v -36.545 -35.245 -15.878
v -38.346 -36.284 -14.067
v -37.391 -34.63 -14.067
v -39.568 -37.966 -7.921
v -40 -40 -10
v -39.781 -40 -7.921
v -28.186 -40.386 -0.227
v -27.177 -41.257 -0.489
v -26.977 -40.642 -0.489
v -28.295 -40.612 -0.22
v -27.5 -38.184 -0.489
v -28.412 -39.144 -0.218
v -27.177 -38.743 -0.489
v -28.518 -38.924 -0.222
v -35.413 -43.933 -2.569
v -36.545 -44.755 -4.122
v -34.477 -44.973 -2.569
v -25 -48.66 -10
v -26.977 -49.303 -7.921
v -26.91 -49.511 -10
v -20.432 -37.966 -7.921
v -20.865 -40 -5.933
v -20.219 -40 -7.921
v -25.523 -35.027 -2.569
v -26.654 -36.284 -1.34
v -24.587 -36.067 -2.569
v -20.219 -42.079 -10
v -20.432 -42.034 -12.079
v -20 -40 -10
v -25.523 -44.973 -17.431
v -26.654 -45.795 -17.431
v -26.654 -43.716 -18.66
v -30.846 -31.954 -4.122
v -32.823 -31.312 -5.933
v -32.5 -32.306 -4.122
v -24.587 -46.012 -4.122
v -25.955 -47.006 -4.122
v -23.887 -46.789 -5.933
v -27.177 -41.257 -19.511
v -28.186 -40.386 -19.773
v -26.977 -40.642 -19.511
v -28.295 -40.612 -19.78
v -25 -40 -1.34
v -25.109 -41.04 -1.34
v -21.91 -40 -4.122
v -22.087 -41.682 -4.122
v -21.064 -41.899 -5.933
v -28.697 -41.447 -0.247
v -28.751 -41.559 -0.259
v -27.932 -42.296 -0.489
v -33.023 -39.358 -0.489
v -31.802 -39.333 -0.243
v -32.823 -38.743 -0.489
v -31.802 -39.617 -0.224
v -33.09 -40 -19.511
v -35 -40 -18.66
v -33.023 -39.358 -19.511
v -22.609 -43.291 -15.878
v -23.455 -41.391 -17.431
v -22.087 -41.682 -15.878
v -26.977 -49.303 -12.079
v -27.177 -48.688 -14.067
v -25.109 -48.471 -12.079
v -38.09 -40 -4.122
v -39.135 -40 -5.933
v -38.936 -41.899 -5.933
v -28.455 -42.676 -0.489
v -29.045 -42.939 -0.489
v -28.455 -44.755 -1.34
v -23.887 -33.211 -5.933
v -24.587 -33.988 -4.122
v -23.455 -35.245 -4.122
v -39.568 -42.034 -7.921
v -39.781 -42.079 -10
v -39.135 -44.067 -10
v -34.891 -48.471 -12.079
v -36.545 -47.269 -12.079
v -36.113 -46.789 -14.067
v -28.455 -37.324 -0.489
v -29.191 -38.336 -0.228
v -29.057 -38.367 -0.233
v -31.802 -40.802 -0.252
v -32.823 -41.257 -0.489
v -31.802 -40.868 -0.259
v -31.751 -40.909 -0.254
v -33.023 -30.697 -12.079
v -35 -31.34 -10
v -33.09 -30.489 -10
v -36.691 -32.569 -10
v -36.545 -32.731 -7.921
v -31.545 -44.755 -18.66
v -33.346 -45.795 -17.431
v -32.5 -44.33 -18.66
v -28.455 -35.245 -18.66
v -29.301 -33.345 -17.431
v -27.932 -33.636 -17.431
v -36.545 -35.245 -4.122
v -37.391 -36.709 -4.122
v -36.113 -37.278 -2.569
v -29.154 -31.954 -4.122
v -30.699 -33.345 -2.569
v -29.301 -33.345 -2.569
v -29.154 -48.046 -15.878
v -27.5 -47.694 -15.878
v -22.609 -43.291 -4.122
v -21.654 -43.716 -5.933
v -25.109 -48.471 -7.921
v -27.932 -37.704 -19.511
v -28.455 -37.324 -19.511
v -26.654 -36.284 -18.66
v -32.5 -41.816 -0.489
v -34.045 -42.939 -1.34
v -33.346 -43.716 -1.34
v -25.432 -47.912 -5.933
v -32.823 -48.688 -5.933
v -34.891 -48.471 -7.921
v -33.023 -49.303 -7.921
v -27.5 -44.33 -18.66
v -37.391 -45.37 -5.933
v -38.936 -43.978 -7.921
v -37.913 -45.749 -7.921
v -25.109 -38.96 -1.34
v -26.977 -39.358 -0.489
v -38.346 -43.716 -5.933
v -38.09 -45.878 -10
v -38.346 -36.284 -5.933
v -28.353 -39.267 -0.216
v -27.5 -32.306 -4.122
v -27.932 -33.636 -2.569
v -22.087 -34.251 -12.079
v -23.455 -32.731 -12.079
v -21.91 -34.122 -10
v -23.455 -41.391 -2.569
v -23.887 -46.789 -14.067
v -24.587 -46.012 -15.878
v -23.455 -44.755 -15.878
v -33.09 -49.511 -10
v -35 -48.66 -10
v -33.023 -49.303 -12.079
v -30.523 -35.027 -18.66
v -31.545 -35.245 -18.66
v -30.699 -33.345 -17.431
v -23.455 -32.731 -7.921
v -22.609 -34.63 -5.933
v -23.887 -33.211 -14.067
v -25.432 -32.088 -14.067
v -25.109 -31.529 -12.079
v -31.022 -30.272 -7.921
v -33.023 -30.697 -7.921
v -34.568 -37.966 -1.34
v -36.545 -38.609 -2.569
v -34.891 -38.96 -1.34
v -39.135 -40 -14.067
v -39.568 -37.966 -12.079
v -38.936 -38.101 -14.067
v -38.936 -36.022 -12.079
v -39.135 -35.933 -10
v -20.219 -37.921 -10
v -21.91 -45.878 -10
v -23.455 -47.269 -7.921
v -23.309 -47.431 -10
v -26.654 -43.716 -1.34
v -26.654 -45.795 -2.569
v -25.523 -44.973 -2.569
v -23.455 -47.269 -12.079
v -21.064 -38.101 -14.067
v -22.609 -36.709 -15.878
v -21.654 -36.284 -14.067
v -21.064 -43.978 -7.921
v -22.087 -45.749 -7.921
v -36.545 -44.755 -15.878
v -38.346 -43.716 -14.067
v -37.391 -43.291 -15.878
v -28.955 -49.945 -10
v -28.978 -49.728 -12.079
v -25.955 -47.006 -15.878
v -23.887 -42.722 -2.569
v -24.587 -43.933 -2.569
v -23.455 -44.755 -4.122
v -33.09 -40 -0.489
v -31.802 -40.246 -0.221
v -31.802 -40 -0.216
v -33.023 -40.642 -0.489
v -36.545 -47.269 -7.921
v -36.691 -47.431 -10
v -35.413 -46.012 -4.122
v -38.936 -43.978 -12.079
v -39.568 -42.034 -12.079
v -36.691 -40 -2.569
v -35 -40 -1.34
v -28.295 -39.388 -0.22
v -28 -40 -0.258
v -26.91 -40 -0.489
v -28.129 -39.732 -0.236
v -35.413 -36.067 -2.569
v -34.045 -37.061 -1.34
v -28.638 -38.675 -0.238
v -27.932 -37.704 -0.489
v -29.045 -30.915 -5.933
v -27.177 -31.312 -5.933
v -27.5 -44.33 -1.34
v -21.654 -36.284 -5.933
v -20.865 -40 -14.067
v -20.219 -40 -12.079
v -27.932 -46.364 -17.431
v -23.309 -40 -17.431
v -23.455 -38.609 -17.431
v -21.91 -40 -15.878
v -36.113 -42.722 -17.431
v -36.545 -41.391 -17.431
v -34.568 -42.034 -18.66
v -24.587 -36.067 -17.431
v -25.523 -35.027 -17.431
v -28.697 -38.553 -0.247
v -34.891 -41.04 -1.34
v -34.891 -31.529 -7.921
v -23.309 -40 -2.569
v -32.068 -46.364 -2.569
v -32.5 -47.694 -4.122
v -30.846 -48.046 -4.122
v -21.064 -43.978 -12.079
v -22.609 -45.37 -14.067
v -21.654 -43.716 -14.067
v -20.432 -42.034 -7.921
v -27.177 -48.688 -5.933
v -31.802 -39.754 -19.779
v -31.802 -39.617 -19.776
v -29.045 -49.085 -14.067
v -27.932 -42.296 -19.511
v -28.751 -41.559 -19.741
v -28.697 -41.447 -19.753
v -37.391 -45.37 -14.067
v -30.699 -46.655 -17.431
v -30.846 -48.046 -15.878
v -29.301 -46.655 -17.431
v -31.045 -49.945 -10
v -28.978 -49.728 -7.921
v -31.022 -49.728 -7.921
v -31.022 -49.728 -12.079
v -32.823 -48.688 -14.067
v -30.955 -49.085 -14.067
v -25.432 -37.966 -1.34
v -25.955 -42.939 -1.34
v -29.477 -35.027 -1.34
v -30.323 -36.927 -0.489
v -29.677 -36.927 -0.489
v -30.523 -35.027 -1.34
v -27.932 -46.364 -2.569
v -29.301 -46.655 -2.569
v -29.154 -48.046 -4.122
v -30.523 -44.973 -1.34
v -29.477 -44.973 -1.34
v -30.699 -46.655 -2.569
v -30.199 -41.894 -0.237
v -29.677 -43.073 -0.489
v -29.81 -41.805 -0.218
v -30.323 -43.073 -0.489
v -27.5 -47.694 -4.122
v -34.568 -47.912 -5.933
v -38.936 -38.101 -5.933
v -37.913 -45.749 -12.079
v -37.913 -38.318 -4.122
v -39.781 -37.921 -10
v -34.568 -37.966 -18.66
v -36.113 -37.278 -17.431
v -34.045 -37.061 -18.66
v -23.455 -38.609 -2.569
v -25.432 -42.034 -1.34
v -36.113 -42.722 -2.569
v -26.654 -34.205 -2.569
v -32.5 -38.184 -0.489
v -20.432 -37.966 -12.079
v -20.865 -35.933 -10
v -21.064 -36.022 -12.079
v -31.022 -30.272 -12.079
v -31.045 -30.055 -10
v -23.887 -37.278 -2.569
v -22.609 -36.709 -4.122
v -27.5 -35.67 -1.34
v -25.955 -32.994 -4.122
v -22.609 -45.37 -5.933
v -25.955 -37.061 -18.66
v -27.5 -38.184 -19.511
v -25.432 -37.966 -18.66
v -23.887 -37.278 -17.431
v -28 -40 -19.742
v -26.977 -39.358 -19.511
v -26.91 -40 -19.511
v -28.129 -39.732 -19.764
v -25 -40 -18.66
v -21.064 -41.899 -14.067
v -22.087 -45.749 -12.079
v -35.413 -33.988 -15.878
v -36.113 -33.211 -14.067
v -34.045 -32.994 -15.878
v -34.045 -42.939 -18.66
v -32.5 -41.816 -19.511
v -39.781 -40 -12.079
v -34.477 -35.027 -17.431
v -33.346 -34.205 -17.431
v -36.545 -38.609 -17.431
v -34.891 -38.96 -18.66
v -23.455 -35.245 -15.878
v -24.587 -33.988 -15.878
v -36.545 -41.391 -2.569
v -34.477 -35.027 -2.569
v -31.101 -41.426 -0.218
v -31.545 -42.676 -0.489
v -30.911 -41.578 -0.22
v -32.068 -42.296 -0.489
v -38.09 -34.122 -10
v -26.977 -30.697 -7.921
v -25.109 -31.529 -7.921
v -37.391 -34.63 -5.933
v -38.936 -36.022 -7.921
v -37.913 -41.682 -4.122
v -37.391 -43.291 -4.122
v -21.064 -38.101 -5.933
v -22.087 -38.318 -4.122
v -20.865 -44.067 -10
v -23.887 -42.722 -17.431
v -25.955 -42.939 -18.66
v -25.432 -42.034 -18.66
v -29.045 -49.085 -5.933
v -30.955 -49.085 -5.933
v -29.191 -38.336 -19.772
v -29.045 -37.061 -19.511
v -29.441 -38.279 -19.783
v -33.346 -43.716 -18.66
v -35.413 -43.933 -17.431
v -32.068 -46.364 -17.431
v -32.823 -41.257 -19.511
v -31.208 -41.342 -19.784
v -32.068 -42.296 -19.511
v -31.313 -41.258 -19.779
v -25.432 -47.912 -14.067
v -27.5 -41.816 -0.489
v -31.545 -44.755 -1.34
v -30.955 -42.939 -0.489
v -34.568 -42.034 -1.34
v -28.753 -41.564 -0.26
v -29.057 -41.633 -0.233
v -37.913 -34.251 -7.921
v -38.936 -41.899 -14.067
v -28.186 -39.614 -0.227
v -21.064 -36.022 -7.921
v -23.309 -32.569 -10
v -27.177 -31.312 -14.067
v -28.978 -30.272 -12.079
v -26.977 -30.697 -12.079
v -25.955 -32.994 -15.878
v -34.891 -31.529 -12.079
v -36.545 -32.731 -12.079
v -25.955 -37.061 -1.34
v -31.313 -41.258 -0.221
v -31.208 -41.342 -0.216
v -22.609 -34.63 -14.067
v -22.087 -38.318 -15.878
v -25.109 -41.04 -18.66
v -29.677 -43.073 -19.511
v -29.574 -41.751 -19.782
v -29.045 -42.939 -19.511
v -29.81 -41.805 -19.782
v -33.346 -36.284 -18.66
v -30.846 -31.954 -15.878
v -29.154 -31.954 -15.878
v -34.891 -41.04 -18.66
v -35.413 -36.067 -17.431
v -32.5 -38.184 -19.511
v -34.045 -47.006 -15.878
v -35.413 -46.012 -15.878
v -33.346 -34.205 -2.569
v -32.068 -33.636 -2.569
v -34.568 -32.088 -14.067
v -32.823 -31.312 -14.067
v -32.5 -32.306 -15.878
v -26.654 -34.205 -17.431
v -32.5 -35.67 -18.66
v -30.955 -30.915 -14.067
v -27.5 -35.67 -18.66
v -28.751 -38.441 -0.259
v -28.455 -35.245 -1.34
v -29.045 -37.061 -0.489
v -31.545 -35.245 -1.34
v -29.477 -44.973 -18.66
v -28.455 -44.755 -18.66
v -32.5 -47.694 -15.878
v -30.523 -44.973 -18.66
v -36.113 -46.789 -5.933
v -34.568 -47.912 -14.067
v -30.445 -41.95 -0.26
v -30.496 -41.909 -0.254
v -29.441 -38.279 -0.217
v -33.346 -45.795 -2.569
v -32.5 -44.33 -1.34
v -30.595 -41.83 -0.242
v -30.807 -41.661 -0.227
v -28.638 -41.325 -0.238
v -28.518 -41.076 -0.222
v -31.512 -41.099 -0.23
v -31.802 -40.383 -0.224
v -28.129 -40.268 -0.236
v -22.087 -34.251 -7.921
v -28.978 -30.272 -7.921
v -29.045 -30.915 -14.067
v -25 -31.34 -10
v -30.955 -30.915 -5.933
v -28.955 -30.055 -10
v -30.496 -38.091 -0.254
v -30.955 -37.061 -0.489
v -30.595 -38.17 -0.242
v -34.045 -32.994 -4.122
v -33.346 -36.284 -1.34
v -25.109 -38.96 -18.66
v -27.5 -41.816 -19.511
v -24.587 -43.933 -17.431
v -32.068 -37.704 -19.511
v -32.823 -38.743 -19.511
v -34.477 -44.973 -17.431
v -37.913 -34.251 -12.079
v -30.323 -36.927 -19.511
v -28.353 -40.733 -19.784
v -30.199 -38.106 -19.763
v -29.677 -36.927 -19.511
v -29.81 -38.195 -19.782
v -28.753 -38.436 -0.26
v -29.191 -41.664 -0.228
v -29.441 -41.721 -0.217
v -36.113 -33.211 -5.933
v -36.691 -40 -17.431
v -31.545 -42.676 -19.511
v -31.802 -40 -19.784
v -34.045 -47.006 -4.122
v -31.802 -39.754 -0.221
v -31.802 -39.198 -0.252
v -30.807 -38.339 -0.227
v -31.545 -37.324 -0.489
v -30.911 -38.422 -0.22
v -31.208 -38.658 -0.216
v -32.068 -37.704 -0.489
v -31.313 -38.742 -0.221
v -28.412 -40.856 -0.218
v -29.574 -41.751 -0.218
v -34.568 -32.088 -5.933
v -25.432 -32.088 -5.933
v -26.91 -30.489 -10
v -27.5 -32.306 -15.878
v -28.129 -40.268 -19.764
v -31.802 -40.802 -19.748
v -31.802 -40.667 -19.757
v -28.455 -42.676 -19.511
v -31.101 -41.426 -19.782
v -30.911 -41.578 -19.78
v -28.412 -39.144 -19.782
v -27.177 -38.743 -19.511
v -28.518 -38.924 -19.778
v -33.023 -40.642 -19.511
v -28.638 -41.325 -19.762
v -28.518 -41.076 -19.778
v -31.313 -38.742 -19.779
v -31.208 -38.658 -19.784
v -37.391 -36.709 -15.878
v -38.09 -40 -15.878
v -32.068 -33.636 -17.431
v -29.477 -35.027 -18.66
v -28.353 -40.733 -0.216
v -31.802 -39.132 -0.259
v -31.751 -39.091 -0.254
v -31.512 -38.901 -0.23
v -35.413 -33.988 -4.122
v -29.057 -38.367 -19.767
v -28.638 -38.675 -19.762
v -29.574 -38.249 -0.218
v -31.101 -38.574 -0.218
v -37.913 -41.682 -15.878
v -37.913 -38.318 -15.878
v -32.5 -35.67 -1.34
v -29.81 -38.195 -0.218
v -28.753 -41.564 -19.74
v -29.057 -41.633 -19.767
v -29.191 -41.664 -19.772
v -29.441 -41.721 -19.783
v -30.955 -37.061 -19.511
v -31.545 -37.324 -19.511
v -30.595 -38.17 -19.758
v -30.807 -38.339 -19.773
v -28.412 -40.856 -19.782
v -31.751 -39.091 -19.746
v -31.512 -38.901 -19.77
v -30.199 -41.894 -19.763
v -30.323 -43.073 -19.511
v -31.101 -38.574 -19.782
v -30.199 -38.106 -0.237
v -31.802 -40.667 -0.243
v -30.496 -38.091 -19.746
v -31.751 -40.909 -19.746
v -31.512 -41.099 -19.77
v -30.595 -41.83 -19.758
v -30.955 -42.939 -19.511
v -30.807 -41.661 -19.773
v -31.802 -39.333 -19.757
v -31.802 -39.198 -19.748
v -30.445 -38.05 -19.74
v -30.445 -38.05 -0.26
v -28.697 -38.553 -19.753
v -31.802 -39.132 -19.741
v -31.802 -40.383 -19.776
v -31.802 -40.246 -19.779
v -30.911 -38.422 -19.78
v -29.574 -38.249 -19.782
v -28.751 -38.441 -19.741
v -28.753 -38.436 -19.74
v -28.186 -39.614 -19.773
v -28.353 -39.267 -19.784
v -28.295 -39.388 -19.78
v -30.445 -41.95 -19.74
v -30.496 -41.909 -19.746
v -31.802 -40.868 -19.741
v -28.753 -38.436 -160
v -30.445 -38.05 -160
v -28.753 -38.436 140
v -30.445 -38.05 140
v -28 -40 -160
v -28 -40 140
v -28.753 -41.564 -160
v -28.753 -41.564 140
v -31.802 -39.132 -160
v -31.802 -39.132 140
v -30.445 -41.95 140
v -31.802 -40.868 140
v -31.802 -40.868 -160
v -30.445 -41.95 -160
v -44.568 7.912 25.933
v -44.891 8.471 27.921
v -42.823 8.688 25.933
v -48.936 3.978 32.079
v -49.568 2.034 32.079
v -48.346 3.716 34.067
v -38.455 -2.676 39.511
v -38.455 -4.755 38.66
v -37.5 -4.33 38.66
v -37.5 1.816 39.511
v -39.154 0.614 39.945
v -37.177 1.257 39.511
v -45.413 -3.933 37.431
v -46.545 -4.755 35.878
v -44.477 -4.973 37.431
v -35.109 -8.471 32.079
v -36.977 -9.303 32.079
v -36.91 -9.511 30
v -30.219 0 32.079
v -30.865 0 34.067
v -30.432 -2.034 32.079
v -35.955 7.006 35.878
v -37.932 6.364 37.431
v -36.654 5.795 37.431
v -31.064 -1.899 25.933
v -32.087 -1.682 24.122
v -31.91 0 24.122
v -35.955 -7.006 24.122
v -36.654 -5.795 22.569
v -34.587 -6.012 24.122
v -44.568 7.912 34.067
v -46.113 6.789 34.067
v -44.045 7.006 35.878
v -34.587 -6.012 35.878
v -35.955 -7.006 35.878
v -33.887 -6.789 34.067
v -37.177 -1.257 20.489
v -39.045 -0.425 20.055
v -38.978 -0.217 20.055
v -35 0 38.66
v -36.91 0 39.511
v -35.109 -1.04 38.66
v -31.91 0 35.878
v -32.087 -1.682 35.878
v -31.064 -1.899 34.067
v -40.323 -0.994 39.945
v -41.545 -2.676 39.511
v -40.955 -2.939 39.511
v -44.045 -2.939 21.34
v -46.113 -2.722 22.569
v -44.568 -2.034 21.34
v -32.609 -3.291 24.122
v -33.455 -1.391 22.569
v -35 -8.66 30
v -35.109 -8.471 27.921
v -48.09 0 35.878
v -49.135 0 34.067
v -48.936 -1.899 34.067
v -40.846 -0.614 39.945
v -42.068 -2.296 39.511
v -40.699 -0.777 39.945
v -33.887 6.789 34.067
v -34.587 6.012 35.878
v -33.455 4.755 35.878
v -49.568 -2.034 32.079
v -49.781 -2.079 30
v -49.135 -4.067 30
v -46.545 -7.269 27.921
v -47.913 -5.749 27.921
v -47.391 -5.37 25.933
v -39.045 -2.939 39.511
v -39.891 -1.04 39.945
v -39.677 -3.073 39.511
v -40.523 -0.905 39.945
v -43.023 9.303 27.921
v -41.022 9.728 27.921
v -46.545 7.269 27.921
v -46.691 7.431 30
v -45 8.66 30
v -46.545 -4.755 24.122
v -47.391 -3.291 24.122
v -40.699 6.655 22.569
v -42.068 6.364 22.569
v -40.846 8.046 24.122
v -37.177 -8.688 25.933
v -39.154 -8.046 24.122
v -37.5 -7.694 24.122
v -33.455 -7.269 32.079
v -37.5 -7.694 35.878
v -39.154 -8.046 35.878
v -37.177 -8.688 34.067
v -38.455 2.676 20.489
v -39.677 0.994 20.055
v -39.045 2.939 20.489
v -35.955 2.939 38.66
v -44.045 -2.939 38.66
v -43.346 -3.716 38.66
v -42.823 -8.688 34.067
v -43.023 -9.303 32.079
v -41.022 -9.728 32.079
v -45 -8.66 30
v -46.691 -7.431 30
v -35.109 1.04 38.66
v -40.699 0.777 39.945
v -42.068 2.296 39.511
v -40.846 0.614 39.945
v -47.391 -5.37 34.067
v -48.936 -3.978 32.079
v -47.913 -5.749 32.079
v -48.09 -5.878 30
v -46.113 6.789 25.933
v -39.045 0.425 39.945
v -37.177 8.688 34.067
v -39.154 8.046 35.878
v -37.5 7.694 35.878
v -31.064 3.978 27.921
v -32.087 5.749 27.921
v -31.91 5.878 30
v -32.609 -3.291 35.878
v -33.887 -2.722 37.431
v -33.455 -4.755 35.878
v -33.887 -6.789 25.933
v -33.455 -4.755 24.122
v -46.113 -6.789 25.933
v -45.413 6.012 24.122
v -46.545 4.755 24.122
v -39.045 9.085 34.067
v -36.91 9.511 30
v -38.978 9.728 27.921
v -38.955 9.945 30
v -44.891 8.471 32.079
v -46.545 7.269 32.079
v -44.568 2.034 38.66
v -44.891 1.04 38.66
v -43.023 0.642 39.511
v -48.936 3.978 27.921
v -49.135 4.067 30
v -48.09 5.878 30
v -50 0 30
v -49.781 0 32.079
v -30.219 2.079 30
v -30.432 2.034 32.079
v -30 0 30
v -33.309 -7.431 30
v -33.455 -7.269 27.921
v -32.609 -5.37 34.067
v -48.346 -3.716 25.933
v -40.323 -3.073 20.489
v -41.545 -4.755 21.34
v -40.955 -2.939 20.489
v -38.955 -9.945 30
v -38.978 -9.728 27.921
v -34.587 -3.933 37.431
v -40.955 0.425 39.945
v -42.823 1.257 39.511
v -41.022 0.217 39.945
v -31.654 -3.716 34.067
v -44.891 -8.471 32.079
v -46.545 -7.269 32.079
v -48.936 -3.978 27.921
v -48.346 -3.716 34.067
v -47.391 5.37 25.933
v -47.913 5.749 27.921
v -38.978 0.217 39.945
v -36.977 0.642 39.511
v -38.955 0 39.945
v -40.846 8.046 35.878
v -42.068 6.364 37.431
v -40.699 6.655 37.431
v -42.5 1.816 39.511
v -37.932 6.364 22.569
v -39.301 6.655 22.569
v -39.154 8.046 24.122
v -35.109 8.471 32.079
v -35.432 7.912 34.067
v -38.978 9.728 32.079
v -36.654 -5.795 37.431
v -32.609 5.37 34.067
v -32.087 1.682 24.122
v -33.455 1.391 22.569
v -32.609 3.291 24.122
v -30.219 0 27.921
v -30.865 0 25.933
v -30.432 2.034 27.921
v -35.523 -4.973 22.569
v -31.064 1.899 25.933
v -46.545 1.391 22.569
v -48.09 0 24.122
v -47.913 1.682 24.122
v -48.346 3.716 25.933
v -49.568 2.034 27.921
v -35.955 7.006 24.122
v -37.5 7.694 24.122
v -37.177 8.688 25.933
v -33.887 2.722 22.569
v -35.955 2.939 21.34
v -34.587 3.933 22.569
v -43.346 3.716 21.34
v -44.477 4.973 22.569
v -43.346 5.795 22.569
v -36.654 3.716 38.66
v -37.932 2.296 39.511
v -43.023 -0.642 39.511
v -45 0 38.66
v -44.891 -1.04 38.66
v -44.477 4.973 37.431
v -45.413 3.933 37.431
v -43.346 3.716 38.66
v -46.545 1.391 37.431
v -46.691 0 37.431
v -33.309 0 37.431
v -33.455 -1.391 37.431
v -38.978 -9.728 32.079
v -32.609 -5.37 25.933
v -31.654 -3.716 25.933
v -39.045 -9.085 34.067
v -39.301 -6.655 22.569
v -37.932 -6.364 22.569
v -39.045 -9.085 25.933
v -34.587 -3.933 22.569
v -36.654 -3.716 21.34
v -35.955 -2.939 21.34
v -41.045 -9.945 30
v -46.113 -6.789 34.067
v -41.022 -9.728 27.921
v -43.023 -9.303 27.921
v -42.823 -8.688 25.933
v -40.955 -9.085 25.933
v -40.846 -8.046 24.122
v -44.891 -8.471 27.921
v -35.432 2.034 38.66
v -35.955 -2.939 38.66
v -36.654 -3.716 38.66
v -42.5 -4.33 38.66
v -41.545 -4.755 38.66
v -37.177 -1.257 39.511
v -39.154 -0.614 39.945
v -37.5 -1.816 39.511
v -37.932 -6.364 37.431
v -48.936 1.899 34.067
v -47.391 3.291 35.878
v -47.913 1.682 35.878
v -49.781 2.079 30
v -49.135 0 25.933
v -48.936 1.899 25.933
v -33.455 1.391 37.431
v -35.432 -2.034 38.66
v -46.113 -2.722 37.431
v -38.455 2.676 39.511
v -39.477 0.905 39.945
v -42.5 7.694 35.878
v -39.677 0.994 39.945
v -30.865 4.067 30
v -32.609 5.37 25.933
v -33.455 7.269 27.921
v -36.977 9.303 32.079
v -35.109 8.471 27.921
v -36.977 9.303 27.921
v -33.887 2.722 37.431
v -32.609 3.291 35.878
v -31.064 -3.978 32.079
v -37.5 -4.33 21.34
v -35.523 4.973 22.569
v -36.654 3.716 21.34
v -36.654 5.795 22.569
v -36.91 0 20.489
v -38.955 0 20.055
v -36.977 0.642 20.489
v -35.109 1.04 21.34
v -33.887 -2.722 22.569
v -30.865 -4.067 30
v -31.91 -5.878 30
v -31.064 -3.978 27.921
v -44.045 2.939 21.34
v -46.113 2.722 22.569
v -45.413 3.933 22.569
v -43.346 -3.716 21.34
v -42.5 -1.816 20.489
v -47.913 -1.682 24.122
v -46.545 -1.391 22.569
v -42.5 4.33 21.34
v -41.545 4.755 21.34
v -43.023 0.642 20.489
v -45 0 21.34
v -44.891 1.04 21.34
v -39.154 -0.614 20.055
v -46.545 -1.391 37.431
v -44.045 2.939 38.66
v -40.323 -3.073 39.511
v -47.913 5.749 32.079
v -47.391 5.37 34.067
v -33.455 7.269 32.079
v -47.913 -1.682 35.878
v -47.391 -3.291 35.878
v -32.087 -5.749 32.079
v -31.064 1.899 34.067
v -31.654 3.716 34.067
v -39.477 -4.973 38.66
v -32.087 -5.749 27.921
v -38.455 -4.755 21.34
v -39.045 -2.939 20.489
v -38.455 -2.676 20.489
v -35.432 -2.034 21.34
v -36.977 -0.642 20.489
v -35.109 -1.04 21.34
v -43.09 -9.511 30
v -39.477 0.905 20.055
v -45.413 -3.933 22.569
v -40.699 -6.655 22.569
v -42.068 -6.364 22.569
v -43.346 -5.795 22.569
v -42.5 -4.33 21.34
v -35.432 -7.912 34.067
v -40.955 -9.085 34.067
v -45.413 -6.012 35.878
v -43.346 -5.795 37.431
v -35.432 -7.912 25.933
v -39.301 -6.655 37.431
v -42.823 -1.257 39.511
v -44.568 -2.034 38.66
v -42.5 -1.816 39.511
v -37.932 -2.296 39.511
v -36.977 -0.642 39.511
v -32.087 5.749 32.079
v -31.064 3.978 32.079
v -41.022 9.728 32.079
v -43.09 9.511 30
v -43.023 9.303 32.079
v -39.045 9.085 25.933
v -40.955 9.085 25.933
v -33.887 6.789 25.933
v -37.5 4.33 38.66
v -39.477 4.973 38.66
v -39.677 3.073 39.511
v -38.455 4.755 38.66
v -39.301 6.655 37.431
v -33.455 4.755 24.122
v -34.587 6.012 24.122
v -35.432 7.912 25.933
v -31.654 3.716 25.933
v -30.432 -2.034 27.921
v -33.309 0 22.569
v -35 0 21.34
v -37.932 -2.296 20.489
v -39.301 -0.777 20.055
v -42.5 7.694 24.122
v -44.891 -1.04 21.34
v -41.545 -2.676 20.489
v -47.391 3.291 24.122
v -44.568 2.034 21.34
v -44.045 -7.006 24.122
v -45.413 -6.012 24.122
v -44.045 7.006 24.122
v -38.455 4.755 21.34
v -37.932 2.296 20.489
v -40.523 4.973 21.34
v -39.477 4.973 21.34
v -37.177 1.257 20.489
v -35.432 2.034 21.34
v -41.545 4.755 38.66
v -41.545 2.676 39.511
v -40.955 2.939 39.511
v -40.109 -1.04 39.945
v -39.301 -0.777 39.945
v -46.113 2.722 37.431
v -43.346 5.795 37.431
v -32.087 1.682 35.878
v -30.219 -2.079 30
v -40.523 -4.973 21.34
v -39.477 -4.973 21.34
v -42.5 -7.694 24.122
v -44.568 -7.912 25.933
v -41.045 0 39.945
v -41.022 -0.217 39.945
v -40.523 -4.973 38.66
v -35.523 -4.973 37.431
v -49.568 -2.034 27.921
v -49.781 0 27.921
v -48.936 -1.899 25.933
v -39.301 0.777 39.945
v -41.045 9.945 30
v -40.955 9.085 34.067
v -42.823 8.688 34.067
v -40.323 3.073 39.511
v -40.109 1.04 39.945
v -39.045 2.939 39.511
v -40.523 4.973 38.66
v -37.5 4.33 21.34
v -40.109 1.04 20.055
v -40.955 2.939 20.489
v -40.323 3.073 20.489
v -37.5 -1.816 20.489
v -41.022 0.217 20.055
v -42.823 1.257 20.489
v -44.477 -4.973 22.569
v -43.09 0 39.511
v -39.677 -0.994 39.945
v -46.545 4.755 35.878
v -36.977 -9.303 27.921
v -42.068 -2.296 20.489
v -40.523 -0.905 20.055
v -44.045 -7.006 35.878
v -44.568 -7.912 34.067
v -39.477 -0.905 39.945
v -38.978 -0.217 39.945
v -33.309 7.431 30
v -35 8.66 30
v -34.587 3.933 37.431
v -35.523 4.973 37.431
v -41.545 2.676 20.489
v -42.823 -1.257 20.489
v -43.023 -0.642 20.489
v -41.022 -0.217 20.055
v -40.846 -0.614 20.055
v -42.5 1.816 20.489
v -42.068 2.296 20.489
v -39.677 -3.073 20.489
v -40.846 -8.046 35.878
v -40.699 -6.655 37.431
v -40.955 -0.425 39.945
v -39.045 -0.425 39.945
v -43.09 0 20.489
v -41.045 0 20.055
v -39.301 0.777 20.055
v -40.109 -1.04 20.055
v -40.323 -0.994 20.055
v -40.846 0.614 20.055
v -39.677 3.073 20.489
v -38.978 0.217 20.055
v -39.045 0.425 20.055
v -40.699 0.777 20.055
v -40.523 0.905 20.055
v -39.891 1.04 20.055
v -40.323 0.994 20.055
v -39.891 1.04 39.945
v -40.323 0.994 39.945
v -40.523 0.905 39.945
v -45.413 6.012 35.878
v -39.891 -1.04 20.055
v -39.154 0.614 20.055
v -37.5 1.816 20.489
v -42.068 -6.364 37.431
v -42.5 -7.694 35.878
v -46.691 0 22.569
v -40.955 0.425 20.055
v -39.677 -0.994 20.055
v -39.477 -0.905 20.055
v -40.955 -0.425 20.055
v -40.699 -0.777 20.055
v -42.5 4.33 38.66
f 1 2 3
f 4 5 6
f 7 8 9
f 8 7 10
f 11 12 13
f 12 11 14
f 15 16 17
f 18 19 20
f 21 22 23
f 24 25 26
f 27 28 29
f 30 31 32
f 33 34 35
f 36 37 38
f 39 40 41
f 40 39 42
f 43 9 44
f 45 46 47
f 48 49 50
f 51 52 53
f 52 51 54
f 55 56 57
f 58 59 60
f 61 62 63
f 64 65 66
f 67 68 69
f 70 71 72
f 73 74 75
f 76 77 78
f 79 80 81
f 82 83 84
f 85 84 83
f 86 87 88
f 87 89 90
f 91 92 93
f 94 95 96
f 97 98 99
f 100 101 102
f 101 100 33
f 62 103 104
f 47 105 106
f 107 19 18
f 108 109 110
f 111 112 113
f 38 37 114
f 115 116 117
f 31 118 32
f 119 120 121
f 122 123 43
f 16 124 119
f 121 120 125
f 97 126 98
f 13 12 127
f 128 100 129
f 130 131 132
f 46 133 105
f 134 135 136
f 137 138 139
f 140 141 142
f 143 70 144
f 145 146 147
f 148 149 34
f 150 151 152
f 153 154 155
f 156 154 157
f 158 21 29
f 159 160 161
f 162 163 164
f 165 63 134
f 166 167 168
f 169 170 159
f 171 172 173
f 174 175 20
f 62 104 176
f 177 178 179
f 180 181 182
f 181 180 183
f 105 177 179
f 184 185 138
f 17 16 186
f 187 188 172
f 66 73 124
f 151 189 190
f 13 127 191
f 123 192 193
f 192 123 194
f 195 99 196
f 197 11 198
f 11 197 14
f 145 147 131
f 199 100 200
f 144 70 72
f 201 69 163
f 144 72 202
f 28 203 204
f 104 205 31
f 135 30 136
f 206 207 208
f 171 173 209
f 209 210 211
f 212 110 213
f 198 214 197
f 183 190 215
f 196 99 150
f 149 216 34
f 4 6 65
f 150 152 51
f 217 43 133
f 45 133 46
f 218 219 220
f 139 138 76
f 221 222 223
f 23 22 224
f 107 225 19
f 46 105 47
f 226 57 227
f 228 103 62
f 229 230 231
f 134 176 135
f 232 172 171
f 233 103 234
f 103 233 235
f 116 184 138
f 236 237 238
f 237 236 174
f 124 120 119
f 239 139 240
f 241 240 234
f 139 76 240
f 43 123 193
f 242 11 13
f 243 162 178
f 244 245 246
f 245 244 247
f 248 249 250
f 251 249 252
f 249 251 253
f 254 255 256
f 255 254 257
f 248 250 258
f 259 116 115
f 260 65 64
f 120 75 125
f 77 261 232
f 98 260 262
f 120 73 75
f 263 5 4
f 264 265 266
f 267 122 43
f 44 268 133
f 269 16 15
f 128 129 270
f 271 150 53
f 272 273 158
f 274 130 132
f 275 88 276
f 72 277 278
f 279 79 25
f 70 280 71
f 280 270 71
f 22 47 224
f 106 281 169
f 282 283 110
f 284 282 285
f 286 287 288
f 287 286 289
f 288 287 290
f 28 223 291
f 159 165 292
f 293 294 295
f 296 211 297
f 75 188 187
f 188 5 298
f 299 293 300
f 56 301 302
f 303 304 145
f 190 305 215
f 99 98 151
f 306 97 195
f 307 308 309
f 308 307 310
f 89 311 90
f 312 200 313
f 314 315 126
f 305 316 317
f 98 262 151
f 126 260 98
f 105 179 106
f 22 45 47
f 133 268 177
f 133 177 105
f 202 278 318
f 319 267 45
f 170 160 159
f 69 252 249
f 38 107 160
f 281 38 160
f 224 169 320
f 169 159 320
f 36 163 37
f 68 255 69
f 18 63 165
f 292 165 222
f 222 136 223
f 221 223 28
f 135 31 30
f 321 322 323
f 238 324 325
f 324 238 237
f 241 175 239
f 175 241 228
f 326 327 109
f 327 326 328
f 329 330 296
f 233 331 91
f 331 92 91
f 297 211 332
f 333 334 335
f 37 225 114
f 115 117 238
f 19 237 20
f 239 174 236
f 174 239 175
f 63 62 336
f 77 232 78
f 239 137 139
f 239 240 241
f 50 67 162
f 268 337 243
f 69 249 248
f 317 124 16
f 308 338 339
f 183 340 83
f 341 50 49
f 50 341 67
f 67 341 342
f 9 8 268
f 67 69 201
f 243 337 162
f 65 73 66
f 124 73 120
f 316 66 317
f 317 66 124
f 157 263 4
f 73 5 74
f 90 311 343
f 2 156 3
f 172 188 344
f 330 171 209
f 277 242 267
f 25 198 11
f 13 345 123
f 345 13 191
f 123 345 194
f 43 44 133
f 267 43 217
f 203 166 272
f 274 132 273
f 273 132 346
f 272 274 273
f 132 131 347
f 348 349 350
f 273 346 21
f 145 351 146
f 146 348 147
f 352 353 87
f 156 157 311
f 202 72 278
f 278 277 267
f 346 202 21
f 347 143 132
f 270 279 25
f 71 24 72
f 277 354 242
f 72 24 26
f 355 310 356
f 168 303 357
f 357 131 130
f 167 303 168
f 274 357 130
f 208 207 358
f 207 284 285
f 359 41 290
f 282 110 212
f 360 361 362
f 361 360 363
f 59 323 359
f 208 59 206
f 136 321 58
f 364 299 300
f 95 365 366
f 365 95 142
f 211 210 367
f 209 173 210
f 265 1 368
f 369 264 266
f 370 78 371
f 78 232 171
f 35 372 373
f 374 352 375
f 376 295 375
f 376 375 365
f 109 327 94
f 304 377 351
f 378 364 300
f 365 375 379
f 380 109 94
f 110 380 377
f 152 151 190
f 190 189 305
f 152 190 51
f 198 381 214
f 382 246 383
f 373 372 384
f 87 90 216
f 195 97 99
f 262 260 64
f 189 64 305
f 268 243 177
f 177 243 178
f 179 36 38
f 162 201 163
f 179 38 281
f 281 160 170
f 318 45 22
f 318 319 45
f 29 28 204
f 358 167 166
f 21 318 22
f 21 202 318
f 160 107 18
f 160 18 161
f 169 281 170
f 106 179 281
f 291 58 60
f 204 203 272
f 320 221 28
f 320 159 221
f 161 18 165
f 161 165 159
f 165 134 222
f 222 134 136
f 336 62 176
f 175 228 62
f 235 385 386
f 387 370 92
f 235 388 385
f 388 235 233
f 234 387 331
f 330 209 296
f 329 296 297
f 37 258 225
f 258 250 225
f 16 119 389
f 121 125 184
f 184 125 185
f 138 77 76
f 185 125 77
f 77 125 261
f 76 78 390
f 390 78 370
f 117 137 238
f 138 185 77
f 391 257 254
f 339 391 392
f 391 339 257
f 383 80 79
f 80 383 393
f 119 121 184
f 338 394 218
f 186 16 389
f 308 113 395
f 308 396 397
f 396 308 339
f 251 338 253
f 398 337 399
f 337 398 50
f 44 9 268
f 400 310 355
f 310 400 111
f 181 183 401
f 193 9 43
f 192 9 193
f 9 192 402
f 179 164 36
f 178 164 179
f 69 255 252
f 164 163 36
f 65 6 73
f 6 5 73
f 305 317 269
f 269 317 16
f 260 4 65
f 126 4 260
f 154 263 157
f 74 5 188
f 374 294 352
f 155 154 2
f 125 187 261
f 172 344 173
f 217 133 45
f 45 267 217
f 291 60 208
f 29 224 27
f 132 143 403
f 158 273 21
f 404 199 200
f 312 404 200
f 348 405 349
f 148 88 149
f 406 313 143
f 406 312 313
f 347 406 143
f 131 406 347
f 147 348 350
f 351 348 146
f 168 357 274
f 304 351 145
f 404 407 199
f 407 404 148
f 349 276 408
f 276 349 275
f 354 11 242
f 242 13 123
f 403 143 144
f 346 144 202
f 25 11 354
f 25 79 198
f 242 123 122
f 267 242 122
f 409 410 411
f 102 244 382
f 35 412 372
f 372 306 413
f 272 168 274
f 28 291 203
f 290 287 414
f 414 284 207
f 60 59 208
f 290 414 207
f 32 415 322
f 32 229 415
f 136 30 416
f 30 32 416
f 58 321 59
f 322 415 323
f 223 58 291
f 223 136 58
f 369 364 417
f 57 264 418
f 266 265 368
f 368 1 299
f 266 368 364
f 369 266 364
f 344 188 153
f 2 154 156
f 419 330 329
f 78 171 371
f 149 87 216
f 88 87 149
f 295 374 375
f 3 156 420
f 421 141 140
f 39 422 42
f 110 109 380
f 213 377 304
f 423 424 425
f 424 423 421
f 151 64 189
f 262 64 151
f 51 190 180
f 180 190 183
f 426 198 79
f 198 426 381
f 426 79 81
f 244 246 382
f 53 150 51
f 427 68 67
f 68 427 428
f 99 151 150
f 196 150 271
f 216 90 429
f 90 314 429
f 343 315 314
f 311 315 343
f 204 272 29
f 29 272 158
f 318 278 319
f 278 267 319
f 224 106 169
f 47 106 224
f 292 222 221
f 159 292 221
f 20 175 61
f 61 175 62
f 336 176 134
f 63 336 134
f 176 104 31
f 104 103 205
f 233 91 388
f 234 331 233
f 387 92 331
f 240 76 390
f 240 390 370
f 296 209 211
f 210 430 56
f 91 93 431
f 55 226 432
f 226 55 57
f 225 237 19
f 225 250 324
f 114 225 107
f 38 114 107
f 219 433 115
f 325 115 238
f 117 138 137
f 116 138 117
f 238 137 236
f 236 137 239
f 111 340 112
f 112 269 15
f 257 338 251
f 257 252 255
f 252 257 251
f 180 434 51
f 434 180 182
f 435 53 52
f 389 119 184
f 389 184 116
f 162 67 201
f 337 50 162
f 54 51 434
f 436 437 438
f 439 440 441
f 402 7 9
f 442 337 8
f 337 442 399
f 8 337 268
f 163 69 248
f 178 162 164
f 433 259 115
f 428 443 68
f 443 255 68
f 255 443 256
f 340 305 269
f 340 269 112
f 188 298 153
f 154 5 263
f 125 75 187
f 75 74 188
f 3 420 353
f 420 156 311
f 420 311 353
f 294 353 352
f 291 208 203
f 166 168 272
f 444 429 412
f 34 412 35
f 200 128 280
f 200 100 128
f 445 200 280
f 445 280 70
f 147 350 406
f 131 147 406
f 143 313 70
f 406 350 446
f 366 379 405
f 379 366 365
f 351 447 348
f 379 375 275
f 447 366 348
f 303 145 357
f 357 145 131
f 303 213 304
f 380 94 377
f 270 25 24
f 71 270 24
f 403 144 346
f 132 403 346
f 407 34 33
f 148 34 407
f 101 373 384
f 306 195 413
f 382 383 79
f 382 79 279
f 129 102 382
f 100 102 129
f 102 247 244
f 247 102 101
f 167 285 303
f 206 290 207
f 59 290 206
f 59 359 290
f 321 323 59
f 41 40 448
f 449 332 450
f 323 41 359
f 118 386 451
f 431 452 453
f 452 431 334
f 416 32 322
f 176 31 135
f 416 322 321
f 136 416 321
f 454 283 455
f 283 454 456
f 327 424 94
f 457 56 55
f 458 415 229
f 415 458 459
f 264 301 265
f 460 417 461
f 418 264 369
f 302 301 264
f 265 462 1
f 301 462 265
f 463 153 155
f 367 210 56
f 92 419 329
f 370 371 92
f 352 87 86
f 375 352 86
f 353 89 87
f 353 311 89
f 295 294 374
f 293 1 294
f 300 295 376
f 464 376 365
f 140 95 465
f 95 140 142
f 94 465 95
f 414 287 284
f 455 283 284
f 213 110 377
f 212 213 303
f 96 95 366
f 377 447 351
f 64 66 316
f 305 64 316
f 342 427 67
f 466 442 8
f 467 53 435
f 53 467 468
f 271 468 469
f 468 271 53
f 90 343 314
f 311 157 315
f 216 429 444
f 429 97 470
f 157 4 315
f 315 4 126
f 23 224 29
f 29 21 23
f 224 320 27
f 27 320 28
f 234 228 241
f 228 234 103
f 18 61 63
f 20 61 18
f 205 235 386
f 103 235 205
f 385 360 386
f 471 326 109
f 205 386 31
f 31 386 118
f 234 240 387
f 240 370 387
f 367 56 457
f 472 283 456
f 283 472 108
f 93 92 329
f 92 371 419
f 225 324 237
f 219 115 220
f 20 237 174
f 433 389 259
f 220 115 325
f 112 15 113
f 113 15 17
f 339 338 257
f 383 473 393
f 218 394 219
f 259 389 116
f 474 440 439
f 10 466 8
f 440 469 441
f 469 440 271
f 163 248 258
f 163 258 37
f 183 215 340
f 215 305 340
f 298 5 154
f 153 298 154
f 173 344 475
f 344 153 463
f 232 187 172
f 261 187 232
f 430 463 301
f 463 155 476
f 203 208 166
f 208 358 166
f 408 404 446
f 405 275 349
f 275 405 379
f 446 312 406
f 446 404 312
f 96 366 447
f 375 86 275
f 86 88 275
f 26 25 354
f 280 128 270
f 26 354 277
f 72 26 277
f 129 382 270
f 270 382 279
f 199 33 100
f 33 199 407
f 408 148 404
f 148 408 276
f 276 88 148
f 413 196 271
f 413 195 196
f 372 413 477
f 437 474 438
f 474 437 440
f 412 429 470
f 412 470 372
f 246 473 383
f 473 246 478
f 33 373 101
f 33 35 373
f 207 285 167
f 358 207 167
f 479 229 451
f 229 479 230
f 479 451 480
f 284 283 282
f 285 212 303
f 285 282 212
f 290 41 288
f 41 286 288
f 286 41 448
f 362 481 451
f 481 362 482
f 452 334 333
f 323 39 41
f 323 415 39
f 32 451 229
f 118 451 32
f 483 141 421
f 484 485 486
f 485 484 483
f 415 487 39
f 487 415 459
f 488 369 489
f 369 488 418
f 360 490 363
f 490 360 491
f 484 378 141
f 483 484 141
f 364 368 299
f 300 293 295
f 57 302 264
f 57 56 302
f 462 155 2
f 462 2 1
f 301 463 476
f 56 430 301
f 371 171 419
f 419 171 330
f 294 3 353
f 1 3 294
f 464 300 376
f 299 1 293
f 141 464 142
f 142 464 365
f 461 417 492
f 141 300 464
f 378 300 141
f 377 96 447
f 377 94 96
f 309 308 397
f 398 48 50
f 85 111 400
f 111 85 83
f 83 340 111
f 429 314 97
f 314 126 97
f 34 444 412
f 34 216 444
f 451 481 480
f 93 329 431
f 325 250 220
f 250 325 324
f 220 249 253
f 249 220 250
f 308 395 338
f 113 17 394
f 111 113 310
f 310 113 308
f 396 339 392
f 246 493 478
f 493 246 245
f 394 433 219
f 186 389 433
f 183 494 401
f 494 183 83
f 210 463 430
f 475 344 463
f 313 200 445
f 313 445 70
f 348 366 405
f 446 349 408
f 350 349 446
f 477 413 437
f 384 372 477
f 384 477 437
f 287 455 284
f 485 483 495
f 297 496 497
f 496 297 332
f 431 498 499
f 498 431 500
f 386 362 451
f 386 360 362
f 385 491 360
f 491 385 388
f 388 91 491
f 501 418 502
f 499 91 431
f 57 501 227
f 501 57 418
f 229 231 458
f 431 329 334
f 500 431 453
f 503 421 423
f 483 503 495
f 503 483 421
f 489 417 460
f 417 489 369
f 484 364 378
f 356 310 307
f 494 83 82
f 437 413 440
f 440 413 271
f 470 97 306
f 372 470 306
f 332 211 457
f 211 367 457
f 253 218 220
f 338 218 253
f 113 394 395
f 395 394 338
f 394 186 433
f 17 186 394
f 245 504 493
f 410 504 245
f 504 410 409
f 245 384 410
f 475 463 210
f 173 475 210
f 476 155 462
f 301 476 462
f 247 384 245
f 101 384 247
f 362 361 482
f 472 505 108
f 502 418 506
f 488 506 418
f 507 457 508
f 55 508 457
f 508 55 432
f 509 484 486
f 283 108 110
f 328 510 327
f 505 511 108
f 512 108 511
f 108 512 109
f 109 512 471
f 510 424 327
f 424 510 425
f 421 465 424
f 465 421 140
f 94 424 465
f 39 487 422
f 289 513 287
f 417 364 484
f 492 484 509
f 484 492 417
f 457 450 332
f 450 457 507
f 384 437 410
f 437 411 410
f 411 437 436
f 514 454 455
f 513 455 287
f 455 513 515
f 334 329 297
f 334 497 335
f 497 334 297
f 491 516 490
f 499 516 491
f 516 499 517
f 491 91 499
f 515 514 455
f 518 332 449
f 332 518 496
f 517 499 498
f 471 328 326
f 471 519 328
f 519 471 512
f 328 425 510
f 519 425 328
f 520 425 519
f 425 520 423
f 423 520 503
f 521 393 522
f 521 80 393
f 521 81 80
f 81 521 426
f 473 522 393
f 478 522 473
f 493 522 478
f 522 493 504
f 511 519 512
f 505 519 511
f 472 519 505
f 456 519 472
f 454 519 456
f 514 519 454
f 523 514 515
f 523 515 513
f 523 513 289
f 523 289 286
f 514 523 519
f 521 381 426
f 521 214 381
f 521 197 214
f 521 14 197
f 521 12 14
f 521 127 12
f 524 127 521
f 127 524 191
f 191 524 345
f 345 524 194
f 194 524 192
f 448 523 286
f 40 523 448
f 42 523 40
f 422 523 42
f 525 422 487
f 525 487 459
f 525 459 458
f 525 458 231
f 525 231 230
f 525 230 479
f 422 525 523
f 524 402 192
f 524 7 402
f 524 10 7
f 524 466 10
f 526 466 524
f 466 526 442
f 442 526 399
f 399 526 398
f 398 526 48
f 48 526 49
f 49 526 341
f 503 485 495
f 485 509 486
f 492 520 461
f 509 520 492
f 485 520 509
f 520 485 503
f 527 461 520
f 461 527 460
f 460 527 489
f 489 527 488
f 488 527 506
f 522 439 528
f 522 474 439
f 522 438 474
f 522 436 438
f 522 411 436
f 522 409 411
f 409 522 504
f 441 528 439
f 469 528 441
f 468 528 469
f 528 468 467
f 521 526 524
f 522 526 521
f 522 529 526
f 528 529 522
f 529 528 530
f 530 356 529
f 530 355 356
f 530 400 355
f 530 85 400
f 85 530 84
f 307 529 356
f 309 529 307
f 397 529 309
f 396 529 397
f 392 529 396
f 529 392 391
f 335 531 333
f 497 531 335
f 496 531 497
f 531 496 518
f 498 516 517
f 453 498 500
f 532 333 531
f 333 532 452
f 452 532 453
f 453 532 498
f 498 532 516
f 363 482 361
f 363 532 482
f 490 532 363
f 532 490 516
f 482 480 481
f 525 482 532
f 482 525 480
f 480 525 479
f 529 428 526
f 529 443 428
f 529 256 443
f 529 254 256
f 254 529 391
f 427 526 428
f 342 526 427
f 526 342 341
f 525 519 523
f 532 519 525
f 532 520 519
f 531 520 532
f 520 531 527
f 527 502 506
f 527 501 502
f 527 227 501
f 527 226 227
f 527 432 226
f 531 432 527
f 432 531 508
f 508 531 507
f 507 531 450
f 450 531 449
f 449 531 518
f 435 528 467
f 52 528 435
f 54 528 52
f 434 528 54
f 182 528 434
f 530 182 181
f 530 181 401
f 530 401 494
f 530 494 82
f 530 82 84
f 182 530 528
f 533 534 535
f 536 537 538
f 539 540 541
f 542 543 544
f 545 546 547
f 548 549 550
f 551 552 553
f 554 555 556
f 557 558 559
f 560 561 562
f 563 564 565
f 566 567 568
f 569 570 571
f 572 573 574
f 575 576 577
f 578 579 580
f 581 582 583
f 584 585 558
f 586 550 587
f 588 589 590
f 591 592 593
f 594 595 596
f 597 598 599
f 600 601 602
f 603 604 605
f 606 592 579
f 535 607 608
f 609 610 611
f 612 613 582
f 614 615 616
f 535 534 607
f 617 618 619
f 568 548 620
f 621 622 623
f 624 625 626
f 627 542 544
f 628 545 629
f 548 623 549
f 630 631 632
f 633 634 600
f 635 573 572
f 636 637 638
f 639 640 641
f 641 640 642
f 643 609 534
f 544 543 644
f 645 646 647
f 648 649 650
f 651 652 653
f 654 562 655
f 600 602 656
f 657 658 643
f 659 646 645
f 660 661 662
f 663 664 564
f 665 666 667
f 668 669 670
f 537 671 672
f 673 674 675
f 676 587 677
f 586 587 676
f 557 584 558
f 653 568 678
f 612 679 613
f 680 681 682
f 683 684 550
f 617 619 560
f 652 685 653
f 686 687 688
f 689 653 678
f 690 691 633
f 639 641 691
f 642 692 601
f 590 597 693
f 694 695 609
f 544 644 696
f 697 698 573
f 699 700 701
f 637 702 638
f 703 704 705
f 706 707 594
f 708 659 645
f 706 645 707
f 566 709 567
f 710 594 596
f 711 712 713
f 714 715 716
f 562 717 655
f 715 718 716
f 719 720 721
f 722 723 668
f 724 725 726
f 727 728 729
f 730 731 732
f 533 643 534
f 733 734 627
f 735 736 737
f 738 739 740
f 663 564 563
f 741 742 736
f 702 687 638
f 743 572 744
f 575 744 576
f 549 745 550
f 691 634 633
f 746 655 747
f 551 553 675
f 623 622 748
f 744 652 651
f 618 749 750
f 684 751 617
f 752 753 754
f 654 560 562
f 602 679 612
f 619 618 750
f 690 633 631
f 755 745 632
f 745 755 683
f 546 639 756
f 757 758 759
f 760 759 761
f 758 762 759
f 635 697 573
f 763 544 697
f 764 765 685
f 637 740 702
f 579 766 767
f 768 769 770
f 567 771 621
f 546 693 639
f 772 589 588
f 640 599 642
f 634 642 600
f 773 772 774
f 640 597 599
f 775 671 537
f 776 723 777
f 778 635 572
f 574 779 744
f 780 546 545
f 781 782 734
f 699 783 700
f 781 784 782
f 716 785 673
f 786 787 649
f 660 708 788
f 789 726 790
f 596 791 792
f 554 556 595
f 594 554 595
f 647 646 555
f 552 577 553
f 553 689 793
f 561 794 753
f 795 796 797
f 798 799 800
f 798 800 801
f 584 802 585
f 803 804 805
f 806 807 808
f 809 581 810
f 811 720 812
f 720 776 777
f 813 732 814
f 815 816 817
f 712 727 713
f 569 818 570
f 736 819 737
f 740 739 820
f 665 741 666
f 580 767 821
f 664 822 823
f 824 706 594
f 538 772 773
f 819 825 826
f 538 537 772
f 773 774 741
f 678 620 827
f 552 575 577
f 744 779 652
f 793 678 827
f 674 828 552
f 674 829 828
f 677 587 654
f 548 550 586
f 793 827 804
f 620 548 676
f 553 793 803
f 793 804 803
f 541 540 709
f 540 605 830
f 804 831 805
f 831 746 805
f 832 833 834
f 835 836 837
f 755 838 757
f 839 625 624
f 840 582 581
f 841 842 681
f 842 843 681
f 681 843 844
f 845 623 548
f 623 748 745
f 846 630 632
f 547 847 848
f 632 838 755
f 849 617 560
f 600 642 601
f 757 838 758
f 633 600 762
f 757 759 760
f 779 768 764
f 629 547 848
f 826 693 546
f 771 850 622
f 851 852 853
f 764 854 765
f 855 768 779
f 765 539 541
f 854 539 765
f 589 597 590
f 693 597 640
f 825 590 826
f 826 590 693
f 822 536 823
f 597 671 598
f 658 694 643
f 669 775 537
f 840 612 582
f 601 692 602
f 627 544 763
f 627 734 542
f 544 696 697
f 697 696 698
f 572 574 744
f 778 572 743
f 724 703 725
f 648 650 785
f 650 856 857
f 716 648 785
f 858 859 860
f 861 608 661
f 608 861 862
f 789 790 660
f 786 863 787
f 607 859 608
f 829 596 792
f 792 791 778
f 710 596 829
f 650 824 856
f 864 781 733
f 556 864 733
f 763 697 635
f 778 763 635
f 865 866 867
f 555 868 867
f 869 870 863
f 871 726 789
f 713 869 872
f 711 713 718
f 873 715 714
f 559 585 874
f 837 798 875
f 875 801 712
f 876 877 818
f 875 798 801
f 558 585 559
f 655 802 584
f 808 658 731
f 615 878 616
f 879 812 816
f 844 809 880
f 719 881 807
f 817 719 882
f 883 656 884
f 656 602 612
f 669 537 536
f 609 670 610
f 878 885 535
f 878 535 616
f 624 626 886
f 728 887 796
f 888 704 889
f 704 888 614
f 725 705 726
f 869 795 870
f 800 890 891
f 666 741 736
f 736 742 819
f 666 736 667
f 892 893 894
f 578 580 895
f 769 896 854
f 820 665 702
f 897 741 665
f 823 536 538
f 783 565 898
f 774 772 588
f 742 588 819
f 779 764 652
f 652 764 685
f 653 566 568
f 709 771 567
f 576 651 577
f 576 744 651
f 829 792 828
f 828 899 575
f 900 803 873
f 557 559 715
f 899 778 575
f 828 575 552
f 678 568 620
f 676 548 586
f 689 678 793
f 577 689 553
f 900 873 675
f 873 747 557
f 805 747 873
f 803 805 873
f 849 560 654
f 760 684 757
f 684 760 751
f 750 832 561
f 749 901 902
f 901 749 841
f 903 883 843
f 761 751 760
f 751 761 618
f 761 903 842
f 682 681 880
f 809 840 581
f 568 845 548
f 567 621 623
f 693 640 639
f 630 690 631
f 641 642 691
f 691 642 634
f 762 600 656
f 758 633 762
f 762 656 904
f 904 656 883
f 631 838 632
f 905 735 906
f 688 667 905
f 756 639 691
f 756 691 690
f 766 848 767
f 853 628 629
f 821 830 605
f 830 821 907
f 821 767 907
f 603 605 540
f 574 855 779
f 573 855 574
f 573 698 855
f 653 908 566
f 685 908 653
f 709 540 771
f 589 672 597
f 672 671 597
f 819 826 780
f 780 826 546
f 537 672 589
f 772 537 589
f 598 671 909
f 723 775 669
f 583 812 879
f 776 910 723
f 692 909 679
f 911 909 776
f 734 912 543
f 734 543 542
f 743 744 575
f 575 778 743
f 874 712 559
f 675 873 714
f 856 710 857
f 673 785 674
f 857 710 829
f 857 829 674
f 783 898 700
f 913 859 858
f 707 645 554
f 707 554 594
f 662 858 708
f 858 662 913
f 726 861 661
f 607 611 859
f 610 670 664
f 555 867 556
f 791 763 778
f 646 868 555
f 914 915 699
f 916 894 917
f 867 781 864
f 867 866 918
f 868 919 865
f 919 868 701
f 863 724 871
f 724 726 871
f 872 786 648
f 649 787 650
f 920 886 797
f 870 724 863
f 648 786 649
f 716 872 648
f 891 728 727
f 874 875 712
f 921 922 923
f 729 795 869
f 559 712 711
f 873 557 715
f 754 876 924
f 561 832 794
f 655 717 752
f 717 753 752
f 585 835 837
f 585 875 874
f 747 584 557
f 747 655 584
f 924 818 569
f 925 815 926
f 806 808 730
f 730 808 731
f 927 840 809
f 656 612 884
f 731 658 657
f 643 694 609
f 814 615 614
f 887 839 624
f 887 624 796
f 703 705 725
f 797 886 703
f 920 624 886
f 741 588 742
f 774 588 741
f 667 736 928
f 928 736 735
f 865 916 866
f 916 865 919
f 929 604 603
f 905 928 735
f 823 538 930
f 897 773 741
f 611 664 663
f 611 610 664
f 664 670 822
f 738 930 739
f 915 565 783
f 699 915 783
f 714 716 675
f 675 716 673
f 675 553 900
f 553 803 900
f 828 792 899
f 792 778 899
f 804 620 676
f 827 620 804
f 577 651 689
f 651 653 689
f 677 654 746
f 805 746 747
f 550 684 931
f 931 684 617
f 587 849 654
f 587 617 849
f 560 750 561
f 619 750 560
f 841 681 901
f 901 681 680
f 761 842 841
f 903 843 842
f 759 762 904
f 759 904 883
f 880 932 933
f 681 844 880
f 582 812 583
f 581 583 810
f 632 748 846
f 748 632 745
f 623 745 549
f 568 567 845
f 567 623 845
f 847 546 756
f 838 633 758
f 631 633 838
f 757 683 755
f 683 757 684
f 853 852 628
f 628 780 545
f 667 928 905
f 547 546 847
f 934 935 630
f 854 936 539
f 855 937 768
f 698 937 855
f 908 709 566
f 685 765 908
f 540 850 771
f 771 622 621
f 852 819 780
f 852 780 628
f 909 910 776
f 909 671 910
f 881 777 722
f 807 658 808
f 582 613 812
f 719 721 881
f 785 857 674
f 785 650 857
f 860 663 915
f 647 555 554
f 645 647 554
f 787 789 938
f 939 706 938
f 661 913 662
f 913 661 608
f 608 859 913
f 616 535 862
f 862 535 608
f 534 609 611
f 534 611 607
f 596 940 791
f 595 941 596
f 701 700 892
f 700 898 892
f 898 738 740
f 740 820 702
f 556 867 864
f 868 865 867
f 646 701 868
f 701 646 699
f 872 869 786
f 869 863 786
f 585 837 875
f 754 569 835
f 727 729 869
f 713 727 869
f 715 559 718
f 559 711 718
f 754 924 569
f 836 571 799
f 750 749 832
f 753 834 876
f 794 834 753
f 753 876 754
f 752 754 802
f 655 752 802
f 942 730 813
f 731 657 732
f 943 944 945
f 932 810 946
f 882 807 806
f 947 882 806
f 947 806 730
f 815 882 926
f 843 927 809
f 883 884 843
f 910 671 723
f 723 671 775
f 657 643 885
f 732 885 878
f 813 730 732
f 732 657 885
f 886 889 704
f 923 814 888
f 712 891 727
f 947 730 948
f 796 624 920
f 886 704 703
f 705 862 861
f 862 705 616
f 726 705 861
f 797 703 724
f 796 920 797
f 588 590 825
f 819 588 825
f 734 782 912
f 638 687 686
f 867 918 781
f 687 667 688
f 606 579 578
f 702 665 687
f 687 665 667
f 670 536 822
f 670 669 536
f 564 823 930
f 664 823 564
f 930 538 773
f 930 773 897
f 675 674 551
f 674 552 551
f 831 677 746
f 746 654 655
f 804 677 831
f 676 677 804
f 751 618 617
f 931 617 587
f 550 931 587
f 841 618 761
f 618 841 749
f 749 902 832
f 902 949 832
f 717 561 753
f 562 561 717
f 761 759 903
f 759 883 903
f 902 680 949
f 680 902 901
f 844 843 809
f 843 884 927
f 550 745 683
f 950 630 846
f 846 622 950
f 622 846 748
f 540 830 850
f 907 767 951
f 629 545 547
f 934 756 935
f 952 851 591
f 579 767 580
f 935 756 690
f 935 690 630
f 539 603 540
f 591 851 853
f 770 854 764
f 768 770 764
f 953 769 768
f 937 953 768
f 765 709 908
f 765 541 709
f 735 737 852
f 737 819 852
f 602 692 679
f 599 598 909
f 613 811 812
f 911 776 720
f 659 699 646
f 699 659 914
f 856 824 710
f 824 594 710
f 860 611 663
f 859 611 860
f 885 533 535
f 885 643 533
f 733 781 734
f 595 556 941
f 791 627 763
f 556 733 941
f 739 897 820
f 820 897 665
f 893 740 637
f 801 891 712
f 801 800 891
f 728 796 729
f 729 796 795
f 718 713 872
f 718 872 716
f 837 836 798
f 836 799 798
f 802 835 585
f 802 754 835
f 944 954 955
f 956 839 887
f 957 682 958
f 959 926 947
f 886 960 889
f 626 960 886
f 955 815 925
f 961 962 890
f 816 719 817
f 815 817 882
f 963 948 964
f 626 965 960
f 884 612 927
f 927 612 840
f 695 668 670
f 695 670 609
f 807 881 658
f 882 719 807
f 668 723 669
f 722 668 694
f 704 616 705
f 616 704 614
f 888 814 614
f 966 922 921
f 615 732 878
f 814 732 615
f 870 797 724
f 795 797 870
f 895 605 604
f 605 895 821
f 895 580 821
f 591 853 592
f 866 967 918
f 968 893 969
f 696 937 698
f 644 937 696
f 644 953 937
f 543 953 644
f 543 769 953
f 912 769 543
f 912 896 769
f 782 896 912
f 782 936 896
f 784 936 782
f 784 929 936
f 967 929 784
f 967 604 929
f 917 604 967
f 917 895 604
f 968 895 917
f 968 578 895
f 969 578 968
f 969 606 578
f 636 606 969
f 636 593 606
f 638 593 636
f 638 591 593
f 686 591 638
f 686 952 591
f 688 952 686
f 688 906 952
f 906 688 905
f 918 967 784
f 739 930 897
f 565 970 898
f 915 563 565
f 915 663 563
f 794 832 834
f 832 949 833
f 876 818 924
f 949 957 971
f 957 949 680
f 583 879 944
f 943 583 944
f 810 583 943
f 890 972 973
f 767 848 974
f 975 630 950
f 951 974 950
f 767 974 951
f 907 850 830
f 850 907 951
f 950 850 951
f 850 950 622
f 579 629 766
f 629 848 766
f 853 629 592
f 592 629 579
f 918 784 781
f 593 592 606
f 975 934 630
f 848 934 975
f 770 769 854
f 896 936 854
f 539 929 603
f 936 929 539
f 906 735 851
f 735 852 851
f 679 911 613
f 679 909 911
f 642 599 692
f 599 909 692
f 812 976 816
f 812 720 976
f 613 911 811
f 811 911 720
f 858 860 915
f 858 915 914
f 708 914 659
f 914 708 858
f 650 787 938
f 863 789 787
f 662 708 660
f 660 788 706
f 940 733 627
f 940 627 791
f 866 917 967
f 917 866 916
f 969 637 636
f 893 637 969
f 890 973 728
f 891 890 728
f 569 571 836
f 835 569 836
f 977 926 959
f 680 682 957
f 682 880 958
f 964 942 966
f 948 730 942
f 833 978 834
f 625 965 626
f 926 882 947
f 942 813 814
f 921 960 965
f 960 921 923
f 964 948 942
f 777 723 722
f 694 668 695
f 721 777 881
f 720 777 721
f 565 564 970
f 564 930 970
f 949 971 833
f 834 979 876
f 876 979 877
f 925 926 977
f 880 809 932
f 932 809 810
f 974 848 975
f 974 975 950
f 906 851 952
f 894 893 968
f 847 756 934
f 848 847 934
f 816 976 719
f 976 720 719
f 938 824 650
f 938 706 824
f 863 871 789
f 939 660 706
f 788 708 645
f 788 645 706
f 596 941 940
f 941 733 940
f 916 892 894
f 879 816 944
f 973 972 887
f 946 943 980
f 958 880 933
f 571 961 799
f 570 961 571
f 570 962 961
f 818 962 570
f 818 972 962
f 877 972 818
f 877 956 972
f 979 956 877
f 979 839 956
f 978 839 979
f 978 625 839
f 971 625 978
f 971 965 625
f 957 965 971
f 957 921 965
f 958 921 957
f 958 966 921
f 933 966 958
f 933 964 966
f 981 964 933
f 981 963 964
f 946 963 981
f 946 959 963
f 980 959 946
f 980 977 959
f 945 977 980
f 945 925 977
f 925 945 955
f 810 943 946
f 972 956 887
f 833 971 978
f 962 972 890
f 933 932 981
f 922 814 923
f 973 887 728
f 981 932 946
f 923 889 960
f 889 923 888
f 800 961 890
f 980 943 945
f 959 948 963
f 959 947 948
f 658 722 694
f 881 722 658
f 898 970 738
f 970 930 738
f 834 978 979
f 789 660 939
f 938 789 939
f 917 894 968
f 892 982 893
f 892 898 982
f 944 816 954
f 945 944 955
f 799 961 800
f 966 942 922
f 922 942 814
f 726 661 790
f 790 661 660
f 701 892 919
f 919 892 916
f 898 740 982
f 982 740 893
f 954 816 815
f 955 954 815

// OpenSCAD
// This indicates the pin (revolute) joint.
// 
// The revolute is generically modeled as
// a coincident point and parallel constraint.


// in-plane constraint

translate([-40,0,30]){
  color("red", 0.5)
    sphere(10);
  rotate(25, [0,1,2])
    color("green", 0.4)
      square([300, 300], true);
}

// parallel-axis constraint

color("red", 0.5){
translate([50,0,50])
  rotate([5,40,0])
    square([300,300], true);
}

color("green", 0.5){
translate([0,10,50])
  rotate([5,40,0])
    square([300,300], true);
}
// application of these two constraints 
// results in t2-r1 DoF for the two components
// (one component fixed).

// You can see that the red component
// is free to move the point in translation 
// along the green plane.
// Red can also rotate about an axis
// perpendicular to the red plane but not
// about the non-parallel plane.

// in-line constraint

translate([-30, -40, -10]) {
color("red", 0.5){
translate([0,0,0])
  rotate([0,0,0])
    sphere(10);
}

color("green", 0.5){
translate([0,0,0])
  rotate([0,0,0])
    cylinder(300, 2, 2, true);
} }

// Consider the path of the earth in its
// orbital plane where is can move in the 
// orbtal plane while rotating on its axis.
// This last constraint pins the red component
// so that it revolves about an axis,
// perpendicular to the parallel constraint and
// passing through the in-line red point.

 
